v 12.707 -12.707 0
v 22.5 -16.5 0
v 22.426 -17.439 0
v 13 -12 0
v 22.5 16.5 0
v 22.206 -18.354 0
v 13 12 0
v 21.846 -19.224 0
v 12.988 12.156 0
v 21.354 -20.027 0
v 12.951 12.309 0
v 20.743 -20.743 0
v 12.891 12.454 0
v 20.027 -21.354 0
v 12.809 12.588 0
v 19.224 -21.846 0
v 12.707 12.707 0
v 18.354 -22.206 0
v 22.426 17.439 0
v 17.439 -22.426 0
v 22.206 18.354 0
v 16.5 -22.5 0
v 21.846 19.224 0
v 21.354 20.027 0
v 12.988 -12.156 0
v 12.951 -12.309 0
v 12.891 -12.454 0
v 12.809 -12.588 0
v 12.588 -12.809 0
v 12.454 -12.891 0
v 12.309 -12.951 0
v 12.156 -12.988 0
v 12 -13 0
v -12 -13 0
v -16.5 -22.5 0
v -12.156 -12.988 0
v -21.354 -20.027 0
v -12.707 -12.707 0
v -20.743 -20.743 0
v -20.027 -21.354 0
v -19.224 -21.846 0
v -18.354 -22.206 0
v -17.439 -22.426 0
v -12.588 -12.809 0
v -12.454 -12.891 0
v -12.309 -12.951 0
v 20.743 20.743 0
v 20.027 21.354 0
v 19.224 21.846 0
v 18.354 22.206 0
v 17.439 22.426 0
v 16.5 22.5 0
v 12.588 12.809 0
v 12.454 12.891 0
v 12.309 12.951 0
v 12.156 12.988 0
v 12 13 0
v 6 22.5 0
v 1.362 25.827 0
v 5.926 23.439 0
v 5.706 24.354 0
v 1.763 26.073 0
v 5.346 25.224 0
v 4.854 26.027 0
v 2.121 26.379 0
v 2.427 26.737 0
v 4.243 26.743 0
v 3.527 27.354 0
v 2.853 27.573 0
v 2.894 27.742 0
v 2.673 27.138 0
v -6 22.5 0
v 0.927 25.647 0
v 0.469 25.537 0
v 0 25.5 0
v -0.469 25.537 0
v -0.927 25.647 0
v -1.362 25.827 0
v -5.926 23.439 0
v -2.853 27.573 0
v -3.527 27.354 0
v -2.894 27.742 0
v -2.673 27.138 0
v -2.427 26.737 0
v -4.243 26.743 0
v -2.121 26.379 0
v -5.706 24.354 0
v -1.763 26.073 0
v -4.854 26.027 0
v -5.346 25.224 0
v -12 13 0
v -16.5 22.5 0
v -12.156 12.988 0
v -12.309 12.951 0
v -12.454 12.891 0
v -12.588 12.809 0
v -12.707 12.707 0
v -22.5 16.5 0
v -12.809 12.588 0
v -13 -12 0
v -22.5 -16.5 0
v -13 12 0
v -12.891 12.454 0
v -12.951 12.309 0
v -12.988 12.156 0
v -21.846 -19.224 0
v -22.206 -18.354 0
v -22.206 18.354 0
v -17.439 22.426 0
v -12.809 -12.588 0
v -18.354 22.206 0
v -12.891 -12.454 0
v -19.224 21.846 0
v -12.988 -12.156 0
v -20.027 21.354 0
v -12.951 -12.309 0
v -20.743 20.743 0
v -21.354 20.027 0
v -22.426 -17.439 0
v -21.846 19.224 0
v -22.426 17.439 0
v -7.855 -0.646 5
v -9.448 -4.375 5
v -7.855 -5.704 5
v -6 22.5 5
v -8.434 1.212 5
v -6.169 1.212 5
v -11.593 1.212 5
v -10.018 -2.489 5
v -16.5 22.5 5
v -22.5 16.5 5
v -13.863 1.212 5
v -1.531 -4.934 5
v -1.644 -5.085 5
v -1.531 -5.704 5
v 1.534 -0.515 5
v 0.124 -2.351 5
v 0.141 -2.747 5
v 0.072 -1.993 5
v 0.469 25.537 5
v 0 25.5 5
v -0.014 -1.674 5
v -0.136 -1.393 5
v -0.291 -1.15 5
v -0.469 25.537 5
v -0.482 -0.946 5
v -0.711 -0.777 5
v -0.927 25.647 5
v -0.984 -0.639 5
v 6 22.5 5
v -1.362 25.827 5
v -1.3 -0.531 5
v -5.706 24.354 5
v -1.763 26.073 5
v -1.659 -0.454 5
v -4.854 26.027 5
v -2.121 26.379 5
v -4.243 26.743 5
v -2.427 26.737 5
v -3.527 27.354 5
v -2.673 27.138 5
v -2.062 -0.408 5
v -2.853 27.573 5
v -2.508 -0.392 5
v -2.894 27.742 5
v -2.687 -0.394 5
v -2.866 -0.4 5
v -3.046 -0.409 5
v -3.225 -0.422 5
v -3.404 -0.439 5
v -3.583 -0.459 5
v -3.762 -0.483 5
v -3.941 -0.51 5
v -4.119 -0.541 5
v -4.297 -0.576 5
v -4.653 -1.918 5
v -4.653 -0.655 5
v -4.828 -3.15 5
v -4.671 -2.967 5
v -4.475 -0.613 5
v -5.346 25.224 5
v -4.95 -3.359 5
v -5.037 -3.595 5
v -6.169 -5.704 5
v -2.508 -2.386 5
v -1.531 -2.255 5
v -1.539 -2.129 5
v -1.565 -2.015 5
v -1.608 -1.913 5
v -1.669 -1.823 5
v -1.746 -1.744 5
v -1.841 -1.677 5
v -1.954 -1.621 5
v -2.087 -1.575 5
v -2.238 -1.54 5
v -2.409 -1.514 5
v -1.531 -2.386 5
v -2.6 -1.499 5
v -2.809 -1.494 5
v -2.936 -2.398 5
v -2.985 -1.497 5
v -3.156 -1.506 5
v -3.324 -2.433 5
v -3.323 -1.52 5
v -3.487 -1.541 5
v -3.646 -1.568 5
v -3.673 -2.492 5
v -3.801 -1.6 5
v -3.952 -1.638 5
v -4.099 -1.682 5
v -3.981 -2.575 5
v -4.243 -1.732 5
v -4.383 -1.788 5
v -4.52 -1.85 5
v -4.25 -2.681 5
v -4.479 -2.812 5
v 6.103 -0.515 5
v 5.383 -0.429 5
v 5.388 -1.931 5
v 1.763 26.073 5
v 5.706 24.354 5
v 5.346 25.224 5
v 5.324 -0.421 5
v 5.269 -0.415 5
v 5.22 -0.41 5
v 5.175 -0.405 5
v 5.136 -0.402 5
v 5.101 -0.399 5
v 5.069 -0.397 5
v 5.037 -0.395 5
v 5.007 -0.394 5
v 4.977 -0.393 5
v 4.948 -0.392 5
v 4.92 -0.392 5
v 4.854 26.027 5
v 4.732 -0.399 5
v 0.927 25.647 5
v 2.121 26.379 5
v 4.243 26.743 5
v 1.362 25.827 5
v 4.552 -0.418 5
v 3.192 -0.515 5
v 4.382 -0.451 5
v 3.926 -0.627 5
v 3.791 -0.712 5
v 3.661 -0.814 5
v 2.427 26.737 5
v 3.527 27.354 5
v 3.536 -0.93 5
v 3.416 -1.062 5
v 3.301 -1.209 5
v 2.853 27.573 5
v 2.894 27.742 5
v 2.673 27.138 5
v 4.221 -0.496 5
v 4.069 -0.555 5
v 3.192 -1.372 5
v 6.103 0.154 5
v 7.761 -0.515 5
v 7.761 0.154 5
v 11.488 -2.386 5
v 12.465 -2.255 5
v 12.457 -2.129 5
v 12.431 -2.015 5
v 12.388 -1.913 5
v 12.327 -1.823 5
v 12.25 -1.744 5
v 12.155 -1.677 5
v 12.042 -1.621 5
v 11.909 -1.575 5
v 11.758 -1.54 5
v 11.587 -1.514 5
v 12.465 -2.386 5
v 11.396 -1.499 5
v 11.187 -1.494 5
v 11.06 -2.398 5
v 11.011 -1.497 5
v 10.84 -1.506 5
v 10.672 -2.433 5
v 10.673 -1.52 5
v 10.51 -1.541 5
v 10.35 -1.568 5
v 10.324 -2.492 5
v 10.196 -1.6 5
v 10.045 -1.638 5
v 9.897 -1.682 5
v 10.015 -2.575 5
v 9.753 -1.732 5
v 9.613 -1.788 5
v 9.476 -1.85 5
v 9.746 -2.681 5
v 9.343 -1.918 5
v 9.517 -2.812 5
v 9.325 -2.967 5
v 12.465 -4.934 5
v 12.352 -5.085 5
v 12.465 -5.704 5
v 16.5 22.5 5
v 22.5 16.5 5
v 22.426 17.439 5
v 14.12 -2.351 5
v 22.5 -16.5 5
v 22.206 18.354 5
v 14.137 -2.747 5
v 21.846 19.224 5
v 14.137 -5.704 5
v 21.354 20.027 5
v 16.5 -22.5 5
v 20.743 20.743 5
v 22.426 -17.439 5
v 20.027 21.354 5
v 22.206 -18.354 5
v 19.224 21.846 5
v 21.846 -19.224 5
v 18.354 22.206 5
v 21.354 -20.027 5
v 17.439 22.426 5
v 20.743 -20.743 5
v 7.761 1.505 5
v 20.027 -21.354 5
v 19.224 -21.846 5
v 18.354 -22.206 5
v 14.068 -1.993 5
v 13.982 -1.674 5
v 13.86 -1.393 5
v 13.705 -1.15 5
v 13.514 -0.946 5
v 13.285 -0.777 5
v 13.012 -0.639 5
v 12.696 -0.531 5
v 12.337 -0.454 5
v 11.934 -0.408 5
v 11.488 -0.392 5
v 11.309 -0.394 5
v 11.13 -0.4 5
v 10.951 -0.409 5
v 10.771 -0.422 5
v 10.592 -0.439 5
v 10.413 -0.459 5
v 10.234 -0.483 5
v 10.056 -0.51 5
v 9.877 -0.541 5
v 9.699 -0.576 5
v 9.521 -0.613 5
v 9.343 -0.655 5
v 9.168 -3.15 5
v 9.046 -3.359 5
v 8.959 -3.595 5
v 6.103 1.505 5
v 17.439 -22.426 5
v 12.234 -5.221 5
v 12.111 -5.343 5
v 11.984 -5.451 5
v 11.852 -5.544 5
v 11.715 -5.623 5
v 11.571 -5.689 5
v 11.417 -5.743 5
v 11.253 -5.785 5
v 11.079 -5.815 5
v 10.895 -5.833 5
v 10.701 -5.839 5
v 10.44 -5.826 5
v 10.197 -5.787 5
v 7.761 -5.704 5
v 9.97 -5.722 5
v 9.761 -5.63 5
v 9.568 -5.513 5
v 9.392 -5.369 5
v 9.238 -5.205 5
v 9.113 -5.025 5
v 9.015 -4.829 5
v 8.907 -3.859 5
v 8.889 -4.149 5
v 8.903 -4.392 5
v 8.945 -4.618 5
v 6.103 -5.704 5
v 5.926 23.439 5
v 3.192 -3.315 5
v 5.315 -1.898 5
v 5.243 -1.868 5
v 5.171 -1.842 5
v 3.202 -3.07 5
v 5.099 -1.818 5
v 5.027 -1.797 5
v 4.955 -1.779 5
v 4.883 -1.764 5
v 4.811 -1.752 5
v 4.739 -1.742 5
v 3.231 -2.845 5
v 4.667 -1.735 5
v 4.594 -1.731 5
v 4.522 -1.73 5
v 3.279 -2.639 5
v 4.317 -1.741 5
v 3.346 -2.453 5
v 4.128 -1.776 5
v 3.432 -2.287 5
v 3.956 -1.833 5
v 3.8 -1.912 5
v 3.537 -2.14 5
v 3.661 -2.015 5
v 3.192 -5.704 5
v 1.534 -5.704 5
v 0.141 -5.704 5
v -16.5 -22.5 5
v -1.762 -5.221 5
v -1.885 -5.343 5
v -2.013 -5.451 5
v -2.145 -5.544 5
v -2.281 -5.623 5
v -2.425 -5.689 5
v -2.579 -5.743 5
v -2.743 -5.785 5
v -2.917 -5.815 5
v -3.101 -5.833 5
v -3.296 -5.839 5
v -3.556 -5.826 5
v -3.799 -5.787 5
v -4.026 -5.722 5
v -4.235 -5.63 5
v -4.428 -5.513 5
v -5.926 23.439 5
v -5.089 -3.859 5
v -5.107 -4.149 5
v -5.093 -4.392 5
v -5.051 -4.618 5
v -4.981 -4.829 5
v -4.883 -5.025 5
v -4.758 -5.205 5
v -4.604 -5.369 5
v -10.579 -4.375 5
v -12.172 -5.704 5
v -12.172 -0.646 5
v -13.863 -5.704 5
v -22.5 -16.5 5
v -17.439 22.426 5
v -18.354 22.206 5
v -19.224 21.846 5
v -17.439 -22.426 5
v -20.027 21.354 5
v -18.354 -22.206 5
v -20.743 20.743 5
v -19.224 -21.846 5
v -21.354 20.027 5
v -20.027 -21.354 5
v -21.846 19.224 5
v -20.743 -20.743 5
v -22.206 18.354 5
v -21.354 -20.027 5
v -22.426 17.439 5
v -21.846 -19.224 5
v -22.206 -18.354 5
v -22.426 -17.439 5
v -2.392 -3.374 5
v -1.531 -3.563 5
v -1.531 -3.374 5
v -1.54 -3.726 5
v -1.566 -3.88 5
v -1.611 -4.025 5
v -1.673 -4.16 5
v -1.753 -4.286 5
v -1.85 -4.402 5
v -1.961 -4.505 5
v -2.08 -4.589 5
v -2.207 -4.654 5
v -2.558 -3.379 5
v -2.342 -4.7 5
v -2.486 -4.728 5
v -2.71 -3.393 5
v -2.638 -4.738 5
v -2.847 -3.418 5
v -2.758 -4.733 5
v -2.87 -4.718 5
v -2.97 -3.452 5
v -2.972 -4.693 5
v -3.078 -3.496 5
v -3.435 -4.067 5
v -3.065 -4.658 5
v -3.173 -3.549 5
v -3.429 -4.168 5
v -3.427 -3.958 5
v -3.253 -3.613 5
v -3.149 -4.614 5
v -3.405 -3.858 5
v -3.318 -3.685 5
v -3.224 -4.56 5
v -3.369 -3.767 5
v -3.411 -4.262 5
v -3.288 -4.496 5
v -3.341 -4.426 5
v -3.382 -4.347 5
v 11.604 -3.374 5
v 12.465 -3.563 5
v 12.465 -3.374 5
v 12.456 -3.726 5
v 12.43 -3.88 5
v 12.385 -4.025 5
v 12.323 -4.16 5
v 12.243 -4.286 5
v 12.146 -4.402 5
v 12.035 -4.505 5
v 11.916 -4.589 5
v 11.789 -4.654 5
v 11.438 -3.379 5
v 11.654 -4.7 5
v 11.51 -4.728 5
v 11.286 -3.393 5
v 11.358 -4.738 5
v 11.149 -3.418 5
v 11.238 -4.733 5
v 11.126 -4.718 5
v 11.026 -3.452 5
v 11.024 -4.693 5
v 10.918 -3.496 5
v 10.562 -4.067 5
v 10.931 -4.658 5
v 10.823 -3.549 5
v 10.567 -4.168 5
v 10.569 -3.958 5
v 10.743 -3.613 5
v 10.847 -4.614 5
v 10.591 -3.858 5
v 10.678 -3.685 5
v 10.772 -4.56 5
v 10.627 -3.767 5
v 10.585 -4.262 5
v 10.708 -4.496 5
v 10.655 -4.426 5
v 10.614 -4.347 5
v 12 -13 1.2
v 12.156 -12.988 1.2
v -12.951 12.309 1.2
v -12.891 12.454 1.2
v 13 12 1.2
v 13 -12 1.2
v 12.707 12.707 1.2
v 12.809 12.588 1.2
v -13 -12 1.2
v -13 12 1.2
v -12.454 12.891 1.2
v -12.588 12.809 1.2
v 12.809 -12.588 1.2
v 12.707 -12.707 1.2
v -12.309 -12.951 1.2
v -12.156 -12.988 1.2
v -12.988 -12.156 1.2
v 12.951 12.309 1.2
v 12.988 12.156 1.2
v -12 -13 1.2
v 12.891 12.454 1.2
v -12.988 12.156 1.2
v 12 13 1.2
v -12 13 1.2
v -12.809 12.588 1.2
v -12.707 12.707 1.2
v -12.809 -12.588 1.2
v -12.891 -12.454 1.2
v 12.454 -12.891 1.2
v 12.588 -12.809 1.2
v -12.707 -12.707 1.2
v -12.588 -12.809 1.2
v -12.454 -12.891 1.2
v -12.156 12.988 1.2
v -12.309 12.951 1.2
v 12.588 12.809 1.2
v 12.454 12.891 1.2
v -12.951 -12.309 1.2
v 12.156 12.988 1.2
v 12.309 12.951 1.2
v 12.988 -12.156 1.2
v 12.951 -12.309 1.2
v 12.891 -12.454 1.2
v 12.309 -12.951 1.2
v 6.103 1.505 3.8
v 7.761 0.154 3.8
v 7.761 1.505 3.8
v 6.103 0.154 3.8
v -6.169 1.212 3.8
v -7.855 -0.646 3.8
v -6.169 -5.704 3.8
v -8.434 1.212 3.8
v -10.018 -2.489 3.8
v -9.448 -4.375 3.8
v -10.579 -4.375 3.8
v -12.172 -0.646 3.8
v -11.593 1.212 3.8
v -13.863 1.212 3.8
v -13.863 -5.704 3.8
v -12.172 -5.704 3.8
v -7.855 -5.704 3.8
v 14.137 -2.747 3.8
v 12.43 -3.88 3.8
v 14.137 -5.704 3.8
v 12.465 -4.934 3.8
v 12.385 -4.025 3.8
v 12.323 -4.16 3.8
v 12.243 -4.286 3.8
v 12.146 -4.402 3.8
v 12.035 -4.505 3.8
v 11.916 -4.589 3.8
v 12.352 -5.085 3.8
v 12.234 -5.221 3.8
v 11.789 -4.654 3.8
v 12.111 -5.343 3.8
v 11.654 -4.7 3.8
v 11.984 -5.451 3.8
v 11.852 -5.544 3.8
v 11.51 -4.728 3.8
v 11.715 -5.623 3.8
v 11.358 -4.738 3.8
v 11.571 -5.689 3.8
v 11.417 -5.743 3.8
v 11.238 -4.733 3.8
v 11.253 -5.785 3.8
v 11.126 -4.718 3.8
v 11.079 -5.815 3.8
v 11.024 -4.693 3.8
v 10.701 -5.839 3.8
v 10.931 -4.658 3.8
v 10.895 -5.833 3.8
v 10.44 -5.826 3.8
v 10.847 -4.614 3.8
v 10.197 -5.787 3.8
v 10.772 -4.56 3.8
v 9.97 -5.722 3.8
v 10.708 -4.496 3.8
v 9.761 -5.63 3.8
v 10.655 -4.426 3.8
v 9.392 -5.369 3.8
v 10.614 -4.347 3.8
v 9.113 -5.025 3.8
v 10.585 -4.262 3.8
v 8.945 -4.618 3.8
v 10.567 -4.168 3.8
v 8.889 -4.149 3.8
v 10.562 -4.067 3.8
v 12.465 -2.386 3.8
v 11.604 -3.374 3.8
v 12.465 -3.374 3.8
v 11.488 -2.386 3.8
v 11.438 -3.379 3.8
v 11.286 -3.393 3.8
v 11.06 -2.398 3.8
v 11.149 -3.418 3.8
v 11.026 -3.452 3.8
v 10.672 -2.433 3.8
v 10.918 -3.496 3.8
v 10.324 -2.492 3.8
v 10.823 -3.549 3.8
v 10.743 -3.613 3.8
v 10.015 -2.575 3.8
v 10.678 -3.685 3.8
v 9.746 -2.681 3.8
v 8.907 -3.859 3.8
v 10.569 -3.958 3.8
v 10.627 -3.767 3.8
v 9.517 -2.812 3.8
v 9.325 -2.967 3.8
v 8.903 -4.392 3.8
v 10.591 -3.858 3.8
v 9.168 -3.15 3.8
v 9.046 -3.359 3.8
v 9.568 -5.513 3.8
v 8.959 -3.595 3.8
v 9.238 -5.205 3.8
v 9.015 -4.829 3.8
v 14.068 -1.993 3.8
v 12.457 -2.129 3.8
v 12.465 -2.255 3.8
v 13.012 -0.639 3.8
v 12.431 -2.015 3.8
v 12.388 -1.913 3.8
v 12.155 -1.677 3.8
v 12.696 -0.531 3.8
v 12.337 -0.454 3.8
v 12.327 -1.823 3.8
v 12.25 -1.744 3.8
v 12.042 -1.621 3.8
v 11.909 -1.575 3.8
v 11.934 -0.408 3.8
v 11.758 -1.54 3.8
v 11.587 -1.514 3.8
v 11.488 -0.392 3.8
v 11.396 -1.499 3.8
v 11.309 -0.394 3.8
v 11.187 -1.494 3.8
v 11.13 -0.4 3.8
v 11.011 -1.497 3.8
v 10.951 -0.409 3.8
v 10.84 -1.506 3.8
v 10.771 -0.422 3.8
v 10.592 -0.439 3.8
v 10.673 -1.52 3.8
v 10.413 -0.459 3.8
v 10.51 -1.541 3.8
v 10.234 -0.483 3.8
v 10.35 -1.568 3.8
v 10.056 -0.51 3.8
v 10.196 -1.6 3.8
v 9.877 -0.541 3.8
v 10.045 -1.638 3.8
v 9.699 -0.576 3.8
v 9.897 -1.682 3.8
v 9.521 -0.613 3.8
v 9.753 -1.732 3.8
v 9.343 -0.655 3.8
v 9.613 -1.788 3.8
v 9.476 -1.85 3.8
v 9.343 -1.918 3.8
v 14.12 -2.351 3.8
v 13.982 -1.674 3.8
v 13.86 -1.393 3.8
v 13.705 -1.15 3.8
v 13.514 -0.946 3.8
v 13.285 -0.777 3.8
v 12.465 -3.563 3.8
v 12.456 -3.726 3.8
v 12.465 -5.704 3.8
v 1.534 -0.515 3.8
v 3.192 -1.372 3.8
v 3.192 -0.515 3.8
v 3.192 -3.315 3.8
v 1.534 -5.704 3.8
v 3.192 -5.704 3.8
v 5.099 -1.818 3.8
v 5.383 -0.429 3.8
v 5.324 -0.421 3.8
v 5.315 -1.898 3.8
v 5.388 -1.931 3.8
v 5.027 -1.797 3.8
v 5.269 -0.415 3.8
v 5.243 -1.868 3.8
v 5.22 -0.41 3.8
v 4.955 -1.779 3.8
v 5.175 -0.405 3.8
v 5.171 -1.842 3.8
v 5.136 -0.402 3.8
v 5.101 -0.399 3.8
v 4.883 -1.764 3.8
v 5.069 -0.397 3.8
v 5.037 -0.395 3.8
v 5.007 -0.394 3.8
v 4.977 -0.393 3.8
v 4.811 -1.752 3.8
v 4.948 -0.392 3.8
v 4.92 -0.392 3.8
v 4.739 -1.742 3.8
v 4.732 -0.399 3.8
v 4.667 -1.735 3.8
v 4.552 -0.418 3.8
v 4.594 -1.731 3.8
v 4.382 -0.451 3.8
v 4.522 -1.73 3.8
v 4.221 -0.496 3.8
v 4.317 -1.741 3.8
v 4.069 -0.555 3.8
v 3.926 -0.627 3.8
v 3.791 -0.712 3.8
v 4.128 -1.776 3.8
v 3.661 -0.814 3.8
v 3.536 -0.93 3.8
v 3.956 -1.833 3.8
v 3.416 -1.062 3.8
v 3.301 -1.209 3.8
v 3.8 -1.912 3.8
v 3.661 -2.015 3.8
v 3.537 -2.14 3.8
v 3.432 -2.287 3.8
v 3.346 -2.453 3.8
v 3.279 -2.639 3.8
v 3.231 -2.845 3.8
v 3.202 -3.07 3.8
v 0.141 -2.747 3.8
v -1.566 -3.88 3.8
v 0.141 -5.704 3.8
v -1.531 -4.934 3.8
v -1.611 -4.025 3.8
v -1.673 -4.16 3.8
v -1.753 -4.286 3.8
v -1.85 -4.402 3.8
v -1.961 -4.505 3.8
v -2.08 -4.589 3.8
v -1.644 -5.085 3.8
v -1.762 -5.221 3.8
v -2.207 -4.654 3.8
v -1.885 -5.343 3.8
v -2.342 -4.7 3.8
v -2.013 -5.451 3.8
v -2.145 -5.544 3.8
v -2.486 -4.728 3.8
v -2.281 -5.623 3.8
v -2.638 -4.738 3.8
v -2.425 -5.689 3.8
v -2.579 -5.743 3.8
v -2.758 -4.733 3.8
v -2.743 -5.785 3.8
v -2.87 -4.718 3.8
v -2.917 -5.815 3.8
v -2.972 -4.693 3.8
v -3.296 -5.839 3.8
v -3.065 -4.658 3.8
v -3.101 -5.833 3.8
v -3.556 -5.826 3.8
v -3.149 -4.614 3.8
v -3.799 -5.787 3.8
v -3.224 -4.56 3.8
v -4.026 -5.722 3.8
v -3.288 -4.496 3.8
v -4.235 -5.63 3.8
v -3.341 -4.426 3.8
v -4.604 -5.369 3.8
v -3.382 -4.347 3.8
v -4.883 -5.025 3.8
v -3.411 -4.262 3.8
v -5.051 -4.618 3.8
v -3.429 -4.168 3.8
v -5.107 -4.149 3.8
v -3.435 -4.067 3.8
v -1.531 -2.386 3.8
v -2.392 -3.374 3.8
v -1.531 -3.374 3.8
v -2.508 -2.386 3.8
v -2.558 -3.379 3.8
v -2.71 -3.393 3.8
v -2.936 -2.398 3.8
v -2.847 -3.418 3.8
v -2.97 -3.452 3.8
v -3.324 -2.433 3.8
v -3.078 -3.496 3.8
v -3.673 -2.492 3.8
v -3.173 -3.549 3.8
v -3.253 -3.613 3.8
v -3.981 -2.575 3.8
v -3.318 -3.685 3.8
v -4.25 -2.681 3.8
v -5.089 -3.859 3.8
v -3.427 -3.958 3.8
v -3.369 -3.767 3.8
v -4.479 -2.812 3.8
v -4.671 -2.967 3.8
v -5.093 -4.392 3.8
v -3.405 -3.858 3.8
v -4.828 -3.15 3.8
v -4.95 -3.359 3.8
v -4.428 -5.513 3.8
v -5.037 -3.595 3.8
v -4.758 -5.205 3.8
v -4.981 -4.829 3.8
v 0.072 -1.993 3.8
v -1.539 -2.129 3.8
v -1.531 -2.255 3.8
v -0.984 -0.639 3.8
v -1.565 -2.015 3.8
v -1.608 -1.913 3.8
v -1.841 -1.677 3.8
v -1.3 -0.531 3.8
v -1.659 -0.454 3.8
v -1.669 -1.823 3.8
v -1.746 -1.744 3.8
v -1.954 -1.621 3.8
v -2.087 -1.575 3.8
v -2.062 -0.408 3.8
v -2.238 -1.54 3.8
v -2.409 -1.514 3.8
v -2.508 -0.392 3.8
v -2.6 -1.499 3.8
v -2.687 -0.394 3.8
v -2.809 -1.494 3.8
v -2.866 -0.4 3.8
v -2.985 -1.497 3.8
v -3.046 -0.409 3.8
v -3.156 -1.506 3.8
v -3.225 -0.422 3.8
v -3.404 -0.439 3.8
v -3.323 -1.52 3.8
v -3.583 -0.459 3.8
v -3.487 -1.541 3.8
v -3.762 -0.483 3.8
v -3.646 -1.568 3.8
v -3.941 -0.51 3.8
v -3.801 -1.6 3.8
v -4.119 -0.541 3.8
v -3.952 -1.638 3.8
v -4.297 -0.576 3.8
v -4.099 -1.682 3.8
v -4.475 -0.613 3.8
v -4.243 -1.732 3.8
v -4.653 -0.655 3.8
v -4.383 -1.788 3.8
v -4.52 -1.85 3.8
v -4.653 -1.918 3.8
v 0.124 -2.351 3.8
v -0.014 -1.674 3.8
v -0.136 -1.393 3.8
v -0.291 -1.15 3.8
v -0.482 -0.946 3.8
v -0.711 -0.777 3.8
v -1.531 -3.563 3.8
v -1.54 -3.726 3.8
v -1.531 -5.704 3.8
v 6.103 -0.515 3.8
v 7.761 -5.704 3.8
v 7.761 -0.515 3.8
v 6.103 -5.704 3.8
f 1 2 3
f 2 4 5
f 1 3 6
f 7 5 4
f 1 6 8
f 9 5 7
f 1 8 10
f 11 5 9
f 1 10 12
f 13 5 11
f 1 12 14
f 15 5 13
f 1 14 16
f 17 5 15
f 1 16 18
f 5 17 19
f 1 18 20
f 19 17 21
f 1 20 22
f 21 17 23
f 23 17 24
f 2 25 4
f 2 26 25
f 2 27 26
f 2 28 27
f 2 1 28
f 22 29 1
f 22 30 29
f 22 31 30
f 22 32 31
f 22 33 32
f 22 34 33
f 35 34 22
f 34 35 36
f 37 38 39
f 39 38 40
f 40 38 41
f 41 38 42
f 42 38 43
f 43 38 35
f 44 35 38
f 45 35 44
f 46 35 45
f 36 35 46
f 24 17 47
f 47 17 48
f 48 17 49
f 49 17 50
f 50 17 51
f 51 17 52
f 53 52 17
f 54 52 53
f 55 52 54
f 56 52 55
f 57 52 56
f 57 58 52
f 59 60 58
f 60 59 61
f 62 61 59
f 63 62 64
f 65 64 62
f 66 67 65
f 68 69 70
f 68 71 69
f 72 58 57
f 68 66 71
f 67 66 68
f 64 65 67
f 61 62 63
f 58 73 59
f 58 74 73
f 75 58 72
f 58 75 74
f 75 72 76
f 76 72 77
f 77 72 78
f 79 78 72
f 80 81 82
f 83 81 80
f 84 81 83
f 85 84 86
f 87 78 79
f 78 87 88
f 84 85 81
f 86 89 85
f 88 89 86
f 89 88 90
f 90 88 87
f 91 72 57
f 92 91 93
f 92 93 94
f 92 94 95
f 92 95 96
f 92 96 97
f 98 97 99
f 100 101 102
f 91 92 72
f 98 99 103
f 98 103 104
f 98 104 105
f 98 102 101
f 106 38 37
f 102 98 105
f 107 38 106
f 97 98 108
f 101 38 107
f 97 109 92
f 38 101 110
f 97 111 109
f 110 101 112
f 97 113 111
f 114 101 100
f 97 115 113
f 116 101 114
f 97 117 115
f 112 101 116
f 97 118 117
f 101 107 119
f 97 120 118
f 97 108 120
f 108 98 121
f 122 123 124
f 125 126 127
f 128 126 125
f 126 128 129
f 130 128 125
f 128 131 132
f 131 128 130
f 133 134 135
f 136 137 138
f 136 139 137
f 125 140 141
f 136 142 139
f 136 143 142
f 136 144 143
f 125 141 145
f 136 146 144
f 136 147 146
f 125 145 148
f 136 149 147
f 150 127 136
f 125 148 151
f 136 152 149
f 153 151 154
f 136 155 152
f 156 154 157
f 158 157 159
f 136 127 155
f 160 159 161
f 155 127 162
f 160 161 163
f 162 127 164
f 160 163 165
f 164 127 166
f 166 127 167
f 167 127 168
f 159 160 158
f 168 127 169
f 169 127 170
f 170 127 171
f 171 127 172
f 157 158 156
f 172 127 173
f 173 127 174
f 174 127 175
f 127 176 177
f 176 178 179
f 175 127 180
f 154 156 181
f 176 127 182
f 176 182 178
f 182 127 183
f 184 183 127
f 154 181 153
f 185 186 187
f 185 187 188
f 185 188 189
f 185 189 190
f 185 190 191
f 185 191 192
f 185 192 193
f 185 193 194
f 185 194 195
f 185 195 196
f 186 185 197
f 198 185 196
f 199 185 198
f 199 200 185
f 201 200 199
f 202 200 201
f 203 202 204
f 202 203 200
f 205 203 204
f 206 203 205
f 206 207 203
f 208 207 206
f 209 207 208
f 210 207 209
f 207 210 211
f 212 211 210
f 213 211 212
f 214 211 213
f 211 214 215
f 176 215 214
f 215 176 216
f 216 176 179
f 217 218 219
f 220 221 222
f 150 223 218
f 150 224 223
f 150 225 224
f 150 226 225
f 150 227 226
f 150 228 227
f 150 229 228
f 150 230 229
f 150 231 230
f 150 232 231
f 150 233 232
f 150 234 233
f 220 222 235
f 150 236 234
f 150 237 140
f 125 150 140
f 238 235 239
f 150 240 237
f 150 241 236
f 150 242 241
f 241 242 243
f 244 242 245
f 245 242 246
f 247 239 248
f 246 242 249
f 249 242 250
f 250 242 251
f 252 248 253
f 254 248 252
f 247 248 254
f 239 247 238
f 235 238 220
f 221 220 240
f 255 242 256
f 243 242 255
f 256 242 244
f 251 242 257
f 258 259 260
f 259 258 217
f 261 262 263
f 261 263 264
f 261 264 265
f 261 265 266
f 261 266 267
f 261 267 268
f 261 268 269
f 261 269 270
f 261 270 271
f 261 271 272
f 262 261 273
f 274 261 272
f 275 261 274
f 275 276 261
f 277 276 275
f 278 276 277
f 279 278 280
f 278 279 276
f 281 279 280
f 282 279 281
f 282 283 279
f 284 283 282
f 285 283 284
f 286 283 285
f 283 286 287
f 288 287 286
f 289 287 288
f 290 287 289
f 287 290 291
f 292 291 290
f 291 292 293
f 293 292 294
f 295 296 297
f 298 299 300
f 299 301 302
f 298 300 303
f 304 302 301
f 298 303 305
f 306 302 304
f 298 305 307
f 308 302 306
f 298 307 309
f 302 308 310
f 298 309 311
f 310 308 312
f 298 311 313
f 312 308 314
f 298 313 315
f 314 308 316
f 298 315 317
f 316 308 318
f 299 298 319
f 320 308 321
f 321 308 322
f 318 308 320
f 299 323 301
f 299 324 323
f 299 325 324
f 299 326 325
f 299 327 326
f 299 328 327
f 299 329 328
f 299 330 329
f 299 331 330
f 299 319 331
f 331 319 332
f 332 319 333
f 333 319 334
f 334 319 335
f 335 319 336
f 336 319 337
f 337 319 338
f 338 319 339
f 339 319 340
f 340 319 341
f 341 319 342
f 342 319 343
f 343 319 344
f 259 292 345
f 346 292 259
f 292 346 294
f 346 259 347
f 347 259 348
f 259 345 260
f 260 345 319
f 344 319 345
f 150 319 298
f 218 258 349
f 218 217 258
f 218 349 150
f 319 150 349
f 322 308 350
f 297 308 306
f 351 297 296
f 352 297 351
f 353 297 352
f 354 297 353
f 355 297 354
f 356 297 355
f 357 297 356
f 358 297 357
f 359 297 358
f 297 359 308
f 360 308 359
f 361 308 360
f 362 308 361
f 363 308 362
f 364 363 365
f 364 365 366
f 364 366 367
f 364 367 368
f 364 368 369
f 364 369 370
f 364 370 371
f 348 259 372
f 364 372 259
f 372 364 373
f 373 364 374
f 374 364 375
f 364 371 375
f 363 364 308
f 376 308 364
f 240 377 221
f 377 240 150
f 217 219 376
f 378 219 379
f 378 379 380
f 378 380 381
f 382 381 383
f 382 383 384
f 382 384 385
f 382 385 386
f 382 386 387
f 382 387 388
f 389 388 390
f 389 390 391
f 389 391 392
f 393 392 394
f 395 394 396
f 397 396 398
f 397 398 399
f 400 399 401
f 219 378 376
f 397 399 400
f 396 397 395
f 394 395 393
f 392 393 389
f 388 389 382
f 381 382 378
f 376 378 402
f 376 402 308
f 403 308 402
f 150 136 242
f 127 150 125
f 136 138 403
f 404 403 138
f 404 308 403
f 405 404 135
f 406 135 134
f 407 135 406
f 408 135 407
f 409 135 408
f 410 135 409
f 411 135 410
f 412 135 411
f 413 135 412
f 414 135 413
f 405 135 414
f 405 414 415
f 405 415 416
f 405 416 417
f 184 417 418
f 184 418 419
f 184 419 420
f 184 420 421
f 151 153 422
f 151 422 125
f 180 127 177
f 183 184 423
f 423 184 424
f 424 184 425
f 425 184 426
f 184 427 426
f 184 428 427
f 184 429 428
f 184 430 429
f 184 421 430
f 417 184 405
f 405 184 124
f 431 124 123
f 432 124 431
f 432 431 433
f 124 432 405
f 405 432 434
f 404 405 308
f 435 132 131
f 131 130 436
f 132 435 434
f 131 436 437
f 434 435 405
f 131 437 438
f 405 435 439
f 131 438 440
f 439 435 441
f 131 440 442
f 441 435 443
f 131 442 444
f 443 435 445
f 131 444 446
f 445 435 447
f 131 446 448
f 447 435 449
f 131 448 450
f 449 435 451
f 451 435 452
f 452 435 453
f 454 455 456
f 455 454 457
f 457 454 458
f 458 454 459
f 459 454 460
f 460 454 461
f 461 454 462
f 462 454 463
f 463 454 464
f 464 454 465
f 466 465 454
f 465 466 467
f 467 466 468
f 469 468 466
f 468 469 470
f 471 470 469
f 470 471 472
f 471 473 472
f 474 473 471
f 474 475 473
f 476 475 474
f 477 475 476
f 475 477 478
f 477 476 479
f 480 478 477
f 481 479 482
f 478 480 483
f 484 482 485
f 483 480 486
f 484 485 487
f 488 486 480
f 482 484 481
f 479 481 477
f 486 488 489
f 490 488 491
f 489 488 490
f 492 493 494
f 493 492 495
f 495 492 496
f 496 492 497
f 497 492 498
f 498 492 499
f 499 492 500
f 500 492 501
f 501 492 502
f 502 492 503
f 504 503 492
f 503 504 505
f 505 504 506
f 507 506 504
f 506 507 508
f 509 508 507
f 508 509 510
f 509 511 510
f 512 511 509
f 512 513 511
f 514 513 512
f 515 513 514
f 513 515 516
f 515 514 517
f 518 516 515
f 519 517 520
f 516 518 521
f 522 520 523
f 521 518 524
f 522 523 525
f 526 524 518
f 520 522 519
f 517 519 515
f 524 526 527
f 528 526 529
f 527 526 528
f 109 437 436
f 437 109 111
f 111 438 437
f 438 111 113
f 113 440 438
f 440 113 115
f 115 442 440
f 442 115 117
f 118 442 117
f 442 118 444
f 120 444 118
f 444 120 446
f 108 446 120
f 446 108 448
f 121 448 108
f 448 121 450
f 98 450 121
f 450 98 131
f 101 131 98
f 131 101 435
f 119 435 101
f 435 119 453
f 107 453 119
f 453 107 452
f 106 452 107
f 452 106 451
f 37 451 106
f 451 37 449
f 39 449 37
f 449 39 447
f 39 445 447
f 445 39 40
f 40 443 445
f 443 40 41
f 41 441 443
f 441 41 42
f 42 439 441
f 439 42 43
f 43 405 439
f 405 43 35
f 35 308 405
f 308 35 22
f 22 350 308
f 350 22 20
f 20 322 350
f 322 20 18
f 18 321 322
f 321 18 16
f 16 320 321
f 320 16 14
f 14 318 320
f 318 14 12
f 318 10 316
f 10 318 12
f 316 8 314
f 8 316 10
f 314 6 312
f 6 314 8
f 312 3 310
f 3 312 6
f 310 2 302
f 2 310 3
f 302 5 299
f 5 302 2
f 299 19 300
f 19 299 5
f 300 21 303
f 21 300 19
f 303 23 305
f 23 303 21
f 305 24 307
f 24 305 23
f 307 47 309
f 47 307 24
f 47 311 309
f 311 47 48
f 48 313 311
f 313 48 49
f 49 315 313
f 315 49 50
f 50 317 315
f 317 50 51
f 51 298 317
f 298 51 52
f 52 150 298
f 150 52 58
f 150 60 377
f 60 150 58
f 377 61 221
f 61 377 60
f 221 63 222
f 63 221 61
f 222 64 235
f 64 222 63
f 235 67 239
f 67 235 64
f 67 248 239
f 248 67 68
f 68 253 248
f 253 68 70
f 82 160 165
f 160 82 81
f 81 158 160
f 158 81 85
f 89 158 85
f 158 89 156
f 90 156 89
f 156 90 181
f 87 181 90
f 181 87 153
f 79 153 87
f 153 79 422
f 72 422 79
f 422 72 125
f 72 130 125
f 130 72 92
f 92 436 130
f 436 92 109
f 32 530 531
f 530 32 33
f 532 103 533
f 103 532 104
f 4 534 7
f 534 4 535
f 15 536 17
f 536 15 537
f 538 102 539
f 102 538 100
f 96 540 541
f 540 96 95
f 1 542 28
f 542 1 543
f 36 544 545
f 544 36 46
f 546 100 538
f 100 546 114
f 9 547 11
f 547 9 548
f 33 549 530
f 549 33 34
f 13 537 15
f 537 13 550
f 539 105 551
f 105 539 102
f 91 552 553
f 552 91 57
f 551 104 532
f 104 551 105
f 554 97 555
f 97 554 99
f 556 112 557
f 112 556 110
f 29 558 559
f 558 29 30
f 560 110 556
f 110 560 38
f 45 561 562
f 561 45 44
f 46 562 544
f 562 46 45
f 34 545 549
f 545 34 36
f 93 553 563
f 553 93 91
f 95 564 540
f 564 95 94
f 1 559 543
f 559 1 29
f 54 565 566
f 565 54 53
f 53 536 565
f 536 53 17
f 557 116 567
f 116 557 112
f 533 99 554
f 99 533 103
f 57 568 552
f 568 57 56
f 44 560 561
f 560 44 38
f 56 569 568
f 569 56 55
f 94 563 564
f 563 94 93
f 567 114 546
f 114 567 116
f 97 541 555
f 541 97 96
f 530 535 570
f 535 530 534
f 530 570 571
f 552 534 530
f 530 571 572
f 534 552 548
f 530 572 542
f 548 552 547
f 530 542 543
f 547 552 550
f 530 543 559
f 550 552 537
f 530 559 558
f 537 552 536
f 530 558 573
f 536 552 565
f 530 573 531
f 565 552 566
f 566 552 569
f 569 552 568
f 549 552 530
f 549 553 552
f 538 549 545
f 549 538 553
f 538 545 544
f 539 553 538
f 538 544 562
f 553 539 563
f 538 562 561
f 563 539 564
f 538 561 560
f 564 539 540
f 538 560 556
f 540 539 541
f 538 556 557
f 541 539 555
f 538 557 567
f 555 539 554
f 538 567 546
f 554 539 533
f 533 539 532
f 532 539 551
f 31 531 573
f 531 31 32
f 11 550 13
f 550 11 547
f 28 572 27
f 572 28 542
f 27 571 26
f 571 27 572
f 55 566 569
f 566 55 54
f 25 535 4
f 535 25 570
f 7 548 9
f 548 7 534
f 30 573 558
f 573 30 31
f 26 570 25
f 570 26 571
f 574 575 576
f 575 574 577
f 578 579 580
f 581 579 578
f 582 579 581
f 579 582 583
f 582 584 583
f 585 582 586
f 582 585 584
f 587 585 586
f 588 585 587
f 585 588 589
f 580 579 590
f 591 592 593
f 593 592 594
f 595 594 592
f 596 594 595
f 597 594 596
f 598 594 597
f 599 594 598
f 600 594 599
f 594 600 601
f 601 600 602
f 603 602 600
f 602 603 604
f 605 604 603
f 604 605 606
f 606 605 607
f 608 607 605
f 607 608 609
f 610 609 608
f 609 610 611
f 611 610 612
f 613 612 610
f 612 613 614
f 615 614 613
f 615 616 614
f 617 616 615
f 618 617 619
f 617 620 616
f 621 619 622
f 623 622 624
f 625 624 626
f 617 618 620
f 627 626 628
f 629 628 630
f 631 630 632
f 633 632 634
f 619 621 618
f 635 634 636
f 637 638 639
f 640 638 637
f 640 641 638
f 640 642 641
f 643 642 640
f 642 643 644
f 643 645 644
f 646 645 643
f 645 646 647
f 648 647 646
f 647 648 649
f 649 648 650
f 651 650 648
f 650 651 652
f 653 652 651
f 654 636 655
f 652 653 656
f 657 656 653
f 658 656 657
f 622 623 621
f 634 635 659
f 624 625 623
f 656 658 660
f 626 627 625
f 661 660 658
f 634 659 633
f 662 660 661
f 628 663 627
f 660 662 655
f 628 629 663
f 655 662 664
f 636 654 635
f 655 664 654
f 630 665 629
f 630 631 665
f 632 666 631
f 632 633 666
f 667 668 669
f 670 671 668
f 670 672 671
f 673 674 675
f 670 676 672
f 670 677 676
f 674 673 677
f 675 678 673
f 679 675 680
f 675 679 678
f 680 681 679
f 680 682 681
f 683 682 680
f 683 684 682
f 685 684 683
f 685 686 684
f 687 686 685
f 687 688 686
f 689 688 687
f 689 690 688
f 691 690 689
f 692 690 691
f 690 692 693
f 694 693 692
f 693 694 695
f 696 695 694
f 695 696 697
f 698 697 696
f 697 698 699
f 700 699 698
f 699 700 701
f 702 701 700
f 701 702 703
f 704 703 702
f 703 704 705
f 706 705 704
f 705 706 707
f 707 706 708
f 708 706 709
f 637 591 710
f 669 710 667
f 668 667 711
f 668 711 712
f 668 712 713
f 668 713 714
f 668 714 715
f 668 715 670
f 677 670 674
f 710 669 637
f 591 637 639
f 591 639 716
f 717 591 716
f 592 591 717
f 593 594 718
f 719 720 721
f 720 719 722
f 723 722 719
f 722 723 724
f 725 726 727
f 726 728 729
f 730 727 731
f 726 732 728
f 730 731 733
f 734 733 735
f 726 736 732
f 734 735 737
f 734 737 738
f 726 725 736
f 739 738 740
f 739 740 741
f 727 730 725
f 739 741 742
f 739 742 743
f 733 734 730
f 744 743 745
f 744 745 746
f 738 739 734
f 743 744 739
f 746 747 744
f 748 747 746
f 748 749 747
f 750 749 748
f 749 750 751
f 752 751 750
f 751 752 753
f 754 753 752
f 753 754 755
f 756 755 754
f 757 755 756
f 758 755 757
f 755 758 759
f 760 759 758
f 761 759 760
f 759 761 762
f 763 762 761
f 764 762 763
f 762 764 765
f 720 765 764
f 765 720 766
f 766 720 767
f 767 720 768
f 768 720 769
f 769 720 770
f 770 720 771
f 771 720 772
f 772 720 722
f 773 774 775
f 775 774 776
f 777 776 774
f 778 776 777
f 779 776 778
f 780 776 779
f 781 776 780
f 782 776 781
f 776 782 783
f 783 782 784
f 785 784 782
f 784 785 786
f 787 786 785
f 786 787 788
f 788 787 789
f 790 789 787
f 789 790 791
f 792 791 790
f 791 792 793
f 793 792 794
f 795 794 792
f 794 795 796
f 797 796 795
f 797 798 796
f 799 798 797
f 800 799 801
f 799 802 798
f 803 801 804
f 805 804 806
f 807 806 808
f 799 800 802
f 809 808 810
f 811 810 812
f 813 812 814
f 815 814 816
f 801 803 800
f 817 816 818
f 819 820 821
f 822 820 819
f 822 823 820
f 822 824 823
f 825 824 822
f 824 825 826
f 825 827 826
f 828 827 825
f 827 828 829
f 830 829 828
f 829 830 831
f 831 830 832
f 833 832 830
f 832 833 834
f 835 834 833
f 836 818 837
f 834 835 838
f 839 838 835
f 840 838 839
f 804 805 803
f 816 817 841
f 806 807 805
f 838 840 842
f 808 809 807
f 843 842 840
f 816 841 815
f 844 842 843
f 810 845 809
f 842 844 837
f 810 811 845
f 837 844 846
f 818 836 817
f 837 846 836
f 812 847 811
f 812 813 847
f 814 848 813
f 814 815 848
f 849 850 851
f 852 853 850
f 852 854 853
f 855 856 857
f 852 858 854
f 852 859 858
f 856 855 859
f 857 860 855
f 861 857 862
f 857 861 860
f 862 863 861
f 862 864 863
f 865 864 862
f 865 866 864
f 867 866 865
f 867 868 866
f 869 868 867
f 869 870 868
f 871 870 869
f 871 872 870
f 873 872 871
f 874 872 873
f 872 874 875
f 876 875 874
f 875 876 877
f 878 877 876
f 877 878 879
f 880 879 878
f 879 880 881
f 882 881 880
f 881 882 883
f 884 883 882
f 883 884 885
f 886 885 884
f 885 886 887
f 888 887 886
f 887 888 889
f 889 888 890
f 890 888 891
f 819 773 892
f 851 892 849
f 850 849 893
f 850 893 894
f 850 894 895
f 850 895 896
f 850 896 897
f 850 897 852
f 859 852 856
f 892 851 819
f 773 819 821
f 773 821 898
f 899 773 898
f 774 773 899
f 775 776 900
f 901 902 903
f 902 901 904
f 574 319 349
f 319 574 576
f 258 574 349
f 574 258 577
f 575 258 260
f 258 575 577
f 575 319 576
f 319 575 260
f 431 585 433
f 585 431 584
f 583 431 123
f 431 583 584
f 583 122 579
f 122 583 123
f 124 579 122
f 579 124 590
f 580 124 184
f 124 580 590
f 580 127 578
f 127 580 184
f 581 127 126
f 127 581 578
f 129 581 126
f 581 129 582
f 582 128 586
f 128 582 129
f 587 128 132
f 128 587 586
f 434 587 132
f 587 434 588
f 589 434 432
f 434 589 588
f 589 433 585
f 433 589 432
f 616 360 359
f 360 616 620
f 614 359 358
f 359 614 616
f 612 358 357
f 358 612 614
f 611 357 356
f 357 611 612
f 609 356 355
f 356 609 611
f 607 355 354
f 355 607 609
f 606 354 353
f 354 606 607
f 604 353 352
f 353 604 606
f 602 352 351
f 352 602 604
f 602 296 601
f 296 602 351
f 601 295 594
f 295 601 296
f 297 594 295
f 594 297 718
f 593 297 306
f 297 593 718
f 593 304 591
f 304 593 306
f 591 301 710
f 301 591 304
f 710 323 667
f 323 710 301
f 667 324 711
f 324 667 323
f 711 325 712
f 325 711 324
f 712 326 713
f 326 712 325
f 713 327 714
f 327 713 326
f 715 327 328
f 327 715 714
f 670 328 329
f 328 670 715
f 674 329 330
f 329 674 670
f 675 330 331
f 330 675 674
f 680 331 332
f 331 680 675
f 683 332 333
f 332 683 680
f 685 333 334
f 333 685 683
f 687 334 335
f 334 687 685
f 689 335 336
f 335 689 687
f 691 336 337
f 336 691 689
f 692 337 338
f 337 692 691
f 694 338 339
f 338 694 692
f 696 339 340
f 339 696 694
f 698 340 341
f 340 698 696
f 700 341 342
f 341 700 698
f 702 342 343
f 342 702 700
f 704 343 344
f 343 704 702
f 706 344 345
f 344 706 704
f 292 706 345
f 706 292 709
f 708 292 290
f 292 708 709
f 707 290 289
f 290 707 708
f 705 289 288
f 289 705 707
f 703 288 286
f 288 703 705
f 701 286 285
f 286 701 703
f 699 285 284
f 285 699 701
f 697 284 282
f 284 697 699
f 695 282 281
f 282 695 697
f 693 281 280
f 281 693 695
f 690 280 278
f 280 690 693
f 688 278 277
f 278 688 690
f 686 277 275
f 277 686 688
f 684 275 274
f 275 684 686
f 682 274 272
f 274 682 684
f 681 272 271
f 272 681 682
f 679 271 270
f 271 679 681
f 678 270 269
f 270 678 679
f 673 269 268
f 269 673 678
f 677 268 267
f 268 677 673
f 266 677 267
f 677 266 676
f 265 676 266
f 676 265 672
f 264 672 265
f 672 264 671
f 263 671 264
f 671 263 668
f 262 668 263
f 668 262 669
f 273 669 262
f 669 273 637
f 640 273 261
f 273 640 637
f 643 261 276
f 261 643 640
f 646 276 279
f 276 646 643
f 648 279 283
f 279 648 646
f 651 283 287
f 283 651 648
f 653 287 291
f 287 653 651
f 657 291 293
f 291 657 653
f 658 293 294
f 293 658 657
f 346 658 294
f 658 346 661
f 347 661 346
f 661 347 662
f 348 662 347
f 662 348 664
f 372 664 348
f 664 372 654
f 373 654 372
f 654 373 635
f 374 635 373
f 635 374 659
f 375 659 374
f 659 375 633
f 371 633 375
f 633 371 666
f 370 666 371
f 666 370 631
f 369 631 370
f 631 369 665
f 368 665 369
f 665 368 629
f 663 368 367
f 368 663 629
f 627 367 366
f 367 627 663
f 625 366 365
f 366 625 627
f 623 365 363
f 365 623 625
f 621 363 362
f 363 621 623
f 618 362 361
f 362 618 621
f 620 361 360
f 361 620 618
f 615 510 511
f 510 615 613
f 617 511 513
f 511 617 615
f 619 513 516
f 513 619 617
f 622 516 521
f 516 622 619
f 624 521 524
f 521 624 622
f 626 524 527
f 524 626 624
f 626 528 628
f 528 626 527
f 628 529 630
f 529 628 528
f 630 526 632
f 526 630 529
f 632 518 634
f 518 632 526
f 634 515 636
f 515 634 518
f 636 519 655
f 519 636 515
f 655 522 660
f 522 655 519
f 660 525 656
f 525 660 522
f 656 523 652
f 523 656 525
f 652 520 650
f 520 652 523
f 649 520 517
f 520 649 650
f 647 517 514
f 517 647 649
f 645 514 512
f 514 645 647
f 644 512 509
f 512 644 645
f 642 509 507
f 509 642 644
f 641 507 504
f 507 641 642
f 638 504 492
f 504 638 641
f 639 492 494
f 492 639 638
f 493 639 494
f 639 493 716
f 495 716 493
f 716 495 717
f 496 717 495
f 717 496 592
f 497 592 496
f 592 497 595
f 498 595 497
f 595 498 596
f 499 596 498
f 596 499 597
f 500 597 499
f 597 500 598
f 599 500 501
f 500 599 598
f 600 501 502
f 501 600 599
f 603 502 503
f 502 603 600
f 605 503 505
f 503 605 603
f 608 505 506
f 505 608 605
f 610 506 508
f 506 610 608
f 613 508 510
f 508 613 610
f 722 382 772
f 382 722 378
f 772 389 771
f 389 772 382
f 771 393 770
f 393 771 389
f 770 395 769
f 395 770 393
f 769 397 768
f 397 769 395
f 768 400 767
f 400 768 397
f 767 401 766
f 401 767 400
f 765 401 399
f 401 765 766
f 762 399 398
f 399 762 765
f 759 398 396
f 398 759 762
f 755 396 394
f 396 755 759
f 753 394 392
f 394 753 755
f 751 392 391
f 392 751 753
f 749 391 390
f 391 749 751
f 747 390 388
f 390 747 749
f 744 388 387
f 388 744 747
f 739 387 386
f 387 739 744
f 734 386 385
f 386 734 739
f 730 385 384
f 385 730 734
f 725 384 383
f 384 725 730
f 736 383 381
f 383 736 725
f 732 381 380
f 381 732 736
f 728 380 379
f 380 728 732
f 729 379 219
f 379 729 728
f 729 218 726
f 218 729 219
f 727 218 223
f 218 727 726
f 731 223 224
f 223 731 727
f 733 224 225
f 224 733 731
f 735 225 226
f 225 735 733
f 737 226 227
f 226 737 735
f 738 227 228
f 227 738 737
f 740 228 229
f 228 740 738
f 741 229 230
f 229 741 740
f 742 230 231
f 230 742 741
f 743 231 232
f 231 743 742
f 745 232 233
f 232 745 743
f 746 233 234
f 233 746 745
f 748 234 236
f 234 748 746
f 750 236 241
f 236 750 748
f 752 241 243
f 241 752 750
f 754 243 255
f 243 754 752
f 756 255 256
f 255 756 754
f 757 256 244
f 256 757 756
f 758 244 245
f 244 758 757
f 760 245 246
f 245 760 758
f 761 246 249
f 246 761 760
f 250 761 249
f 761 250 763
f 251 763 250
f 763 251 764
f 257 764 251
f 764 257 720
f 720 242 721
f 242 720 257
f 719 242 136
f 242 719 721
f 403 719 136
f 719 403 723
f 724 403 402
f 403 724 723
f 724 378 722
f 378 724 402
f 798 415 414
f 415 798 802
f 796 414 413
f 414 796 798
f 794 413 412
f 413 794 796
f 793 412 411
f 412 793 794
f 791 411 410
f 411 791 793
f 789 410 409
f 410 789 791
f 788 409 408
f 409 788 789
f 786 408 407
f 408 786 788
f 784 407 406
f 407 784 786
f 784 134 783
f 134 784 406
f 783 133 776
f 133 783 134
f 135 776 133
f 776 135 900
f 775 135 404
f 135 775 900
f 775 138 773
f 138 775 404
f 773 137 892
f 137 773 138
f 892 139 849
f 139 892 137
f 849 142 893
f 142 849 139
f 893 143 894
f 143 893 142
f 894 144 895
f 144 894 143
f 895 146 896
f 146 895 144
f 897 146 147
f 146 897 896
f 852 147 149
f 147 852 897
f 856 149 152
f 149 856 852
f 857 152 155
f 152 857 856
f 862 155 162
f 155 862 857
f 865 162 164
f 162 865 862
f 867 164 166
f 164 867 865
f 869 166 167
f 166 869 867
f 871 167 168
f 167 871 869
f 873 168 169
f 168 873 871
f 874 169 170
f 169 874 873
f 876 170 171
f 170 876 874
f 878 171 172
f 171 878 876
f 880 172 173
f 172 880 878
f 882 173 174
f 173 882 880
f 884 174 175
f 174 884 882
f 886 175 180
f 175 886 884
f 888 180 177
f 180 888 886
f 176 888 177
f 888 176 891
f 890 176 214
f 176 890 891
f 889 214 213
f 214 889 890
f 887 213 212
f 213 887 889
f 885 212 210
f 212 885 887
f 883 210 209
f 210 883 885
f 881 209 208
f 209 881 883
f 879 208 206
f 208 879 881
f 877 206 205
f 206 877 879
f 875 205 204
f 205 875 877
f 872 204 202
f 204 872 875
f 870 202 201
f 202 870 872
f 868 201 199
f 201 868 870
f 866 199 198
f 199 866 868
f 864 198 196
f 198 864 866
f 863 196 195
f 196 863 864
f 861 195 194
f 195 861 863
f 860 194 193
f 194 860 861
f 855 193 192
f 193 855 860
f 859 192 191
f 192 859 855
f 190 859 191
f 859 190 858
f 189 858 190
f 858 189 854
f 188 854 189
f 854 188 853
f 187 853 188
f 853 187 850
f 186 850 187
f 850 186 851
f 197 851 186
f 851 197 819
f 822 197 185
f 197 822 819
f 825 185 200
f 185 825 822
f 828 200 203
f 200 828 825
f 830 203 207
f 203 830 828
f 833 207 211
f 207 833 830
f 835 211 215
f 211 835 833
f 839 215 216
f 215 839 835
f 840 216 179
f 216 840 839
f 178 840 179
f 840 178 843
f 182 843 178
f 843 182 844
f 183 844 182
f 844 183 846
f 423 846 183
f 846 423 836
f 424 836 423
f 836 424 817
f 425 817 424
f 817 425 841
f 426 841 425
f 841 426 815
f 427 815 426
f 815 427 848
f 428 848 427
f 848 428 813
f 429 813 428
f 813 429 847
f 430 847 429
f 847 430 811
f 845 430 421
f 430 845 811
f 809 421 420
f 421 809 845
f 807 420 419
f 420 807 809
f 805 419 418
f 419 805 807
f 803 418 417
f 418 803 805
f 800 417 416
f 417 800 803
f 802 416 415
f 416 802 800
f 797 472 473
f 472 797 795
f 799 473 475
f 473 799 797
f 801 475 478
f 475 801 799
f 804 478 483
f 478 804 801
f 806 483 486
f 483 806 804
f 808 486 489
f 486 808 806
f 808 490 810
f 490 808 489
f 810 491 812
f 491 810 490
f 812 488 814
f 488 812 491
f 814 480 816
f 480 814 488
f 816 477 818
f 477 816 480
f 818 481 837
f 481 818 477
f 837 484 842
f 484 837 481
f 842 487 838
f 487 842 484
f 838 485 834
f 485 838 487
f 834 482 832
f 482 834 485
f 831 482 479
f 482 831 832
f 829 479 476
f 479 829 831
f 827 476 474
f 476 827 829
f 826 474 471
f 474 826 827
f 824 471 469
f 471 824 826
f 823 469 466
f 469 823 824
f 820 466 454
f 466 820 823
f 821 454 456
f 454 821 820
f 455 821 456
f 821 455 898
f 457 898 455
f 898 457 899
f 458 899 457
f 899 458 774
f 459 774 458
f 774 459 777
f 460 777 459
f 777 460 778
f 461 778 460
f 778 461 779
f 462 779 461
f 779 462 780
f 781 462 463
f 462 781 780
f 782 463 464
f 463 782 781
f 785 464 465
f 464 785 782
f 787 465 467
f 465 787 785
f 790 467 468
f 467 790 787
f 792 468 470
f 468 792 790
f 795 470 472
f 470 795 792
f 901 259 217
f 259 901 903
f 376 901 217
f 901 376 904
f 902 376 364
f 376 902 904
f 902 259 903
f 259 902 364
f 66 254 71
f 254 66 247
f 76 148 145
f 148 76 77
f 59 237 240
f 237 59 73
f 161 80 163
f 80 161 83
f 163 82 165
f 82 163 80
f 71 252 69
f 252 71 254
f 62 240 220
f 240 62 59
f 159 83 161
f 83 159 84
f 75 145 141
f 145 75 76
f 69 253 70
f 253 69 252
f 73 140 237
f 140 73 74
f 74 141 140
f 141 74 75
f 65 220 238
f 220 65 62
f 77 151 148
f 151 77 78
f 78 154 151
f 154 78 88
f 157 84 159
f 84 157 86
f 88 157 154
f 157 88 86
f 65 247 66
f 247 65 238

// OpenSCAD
// Square NFC Keychain
// Square keychain with NFC tag cavity and personalized name

// --- Parameters ---
Name          = "Maria";
Font          = "Bebas Neue";
Name_Size     = 28;
Side          = 45;
Corner_Radius = 6;
Thickness     = 5;
Ring_Hole_D   = 6;
NFC_Width     = 26;
NFC_Height    = 26;
NFC_Depth     = 1.2;
Text_Depth    = 1.2;

$fn = 40;

module name_shape(txt, fnt) {
  resize([Name_Size, 0, 0], auto=true)
  text(txt, size=10, font=fnt, halign="center", valign="center");
}

module square_body_2d() {
  offset(r=Corner_Radius) offset(-Corner_Radius)
  square([Side, Side], center=true);
}

module ring_stem_2d() {
  hull() {
    translate([0, Side / 2])
    circle(d=Ring_Hole_D + 6);
    translate([0, Side / 2 - 4])
    square([Ring_Hole_D + 6, 1], center=true);
  }
}

module keychain_2d() {
  union() {
    square_body_2d();
    ring_stem_2d();
  }
}

difference() {
  linear_extrude(Thickness)
  keychain_2d();

  // NFC cavity on back
  translate([0, 0, -0.5])
  linear_extrude(NFC_Depth + 0.5)
  offset(r=1) offset(-1)
  square([NFC_Width, NFC_Height], center=true);

  // Name engraved on front
  translate([0, -Side * 0.05, Thickness - Text_Depth])
  linear_extrude(Text_Depth + 0.5)
  name_shape(Name, str(Font, ":style=Bold"));

  // Ring hole
  translate([0, Side / 2 + Ring_Hole_D / 2 + 3, -0.5])
  linear_extrude(Thickness + 1)
  circle(d=Ring_Hole_D);
}
